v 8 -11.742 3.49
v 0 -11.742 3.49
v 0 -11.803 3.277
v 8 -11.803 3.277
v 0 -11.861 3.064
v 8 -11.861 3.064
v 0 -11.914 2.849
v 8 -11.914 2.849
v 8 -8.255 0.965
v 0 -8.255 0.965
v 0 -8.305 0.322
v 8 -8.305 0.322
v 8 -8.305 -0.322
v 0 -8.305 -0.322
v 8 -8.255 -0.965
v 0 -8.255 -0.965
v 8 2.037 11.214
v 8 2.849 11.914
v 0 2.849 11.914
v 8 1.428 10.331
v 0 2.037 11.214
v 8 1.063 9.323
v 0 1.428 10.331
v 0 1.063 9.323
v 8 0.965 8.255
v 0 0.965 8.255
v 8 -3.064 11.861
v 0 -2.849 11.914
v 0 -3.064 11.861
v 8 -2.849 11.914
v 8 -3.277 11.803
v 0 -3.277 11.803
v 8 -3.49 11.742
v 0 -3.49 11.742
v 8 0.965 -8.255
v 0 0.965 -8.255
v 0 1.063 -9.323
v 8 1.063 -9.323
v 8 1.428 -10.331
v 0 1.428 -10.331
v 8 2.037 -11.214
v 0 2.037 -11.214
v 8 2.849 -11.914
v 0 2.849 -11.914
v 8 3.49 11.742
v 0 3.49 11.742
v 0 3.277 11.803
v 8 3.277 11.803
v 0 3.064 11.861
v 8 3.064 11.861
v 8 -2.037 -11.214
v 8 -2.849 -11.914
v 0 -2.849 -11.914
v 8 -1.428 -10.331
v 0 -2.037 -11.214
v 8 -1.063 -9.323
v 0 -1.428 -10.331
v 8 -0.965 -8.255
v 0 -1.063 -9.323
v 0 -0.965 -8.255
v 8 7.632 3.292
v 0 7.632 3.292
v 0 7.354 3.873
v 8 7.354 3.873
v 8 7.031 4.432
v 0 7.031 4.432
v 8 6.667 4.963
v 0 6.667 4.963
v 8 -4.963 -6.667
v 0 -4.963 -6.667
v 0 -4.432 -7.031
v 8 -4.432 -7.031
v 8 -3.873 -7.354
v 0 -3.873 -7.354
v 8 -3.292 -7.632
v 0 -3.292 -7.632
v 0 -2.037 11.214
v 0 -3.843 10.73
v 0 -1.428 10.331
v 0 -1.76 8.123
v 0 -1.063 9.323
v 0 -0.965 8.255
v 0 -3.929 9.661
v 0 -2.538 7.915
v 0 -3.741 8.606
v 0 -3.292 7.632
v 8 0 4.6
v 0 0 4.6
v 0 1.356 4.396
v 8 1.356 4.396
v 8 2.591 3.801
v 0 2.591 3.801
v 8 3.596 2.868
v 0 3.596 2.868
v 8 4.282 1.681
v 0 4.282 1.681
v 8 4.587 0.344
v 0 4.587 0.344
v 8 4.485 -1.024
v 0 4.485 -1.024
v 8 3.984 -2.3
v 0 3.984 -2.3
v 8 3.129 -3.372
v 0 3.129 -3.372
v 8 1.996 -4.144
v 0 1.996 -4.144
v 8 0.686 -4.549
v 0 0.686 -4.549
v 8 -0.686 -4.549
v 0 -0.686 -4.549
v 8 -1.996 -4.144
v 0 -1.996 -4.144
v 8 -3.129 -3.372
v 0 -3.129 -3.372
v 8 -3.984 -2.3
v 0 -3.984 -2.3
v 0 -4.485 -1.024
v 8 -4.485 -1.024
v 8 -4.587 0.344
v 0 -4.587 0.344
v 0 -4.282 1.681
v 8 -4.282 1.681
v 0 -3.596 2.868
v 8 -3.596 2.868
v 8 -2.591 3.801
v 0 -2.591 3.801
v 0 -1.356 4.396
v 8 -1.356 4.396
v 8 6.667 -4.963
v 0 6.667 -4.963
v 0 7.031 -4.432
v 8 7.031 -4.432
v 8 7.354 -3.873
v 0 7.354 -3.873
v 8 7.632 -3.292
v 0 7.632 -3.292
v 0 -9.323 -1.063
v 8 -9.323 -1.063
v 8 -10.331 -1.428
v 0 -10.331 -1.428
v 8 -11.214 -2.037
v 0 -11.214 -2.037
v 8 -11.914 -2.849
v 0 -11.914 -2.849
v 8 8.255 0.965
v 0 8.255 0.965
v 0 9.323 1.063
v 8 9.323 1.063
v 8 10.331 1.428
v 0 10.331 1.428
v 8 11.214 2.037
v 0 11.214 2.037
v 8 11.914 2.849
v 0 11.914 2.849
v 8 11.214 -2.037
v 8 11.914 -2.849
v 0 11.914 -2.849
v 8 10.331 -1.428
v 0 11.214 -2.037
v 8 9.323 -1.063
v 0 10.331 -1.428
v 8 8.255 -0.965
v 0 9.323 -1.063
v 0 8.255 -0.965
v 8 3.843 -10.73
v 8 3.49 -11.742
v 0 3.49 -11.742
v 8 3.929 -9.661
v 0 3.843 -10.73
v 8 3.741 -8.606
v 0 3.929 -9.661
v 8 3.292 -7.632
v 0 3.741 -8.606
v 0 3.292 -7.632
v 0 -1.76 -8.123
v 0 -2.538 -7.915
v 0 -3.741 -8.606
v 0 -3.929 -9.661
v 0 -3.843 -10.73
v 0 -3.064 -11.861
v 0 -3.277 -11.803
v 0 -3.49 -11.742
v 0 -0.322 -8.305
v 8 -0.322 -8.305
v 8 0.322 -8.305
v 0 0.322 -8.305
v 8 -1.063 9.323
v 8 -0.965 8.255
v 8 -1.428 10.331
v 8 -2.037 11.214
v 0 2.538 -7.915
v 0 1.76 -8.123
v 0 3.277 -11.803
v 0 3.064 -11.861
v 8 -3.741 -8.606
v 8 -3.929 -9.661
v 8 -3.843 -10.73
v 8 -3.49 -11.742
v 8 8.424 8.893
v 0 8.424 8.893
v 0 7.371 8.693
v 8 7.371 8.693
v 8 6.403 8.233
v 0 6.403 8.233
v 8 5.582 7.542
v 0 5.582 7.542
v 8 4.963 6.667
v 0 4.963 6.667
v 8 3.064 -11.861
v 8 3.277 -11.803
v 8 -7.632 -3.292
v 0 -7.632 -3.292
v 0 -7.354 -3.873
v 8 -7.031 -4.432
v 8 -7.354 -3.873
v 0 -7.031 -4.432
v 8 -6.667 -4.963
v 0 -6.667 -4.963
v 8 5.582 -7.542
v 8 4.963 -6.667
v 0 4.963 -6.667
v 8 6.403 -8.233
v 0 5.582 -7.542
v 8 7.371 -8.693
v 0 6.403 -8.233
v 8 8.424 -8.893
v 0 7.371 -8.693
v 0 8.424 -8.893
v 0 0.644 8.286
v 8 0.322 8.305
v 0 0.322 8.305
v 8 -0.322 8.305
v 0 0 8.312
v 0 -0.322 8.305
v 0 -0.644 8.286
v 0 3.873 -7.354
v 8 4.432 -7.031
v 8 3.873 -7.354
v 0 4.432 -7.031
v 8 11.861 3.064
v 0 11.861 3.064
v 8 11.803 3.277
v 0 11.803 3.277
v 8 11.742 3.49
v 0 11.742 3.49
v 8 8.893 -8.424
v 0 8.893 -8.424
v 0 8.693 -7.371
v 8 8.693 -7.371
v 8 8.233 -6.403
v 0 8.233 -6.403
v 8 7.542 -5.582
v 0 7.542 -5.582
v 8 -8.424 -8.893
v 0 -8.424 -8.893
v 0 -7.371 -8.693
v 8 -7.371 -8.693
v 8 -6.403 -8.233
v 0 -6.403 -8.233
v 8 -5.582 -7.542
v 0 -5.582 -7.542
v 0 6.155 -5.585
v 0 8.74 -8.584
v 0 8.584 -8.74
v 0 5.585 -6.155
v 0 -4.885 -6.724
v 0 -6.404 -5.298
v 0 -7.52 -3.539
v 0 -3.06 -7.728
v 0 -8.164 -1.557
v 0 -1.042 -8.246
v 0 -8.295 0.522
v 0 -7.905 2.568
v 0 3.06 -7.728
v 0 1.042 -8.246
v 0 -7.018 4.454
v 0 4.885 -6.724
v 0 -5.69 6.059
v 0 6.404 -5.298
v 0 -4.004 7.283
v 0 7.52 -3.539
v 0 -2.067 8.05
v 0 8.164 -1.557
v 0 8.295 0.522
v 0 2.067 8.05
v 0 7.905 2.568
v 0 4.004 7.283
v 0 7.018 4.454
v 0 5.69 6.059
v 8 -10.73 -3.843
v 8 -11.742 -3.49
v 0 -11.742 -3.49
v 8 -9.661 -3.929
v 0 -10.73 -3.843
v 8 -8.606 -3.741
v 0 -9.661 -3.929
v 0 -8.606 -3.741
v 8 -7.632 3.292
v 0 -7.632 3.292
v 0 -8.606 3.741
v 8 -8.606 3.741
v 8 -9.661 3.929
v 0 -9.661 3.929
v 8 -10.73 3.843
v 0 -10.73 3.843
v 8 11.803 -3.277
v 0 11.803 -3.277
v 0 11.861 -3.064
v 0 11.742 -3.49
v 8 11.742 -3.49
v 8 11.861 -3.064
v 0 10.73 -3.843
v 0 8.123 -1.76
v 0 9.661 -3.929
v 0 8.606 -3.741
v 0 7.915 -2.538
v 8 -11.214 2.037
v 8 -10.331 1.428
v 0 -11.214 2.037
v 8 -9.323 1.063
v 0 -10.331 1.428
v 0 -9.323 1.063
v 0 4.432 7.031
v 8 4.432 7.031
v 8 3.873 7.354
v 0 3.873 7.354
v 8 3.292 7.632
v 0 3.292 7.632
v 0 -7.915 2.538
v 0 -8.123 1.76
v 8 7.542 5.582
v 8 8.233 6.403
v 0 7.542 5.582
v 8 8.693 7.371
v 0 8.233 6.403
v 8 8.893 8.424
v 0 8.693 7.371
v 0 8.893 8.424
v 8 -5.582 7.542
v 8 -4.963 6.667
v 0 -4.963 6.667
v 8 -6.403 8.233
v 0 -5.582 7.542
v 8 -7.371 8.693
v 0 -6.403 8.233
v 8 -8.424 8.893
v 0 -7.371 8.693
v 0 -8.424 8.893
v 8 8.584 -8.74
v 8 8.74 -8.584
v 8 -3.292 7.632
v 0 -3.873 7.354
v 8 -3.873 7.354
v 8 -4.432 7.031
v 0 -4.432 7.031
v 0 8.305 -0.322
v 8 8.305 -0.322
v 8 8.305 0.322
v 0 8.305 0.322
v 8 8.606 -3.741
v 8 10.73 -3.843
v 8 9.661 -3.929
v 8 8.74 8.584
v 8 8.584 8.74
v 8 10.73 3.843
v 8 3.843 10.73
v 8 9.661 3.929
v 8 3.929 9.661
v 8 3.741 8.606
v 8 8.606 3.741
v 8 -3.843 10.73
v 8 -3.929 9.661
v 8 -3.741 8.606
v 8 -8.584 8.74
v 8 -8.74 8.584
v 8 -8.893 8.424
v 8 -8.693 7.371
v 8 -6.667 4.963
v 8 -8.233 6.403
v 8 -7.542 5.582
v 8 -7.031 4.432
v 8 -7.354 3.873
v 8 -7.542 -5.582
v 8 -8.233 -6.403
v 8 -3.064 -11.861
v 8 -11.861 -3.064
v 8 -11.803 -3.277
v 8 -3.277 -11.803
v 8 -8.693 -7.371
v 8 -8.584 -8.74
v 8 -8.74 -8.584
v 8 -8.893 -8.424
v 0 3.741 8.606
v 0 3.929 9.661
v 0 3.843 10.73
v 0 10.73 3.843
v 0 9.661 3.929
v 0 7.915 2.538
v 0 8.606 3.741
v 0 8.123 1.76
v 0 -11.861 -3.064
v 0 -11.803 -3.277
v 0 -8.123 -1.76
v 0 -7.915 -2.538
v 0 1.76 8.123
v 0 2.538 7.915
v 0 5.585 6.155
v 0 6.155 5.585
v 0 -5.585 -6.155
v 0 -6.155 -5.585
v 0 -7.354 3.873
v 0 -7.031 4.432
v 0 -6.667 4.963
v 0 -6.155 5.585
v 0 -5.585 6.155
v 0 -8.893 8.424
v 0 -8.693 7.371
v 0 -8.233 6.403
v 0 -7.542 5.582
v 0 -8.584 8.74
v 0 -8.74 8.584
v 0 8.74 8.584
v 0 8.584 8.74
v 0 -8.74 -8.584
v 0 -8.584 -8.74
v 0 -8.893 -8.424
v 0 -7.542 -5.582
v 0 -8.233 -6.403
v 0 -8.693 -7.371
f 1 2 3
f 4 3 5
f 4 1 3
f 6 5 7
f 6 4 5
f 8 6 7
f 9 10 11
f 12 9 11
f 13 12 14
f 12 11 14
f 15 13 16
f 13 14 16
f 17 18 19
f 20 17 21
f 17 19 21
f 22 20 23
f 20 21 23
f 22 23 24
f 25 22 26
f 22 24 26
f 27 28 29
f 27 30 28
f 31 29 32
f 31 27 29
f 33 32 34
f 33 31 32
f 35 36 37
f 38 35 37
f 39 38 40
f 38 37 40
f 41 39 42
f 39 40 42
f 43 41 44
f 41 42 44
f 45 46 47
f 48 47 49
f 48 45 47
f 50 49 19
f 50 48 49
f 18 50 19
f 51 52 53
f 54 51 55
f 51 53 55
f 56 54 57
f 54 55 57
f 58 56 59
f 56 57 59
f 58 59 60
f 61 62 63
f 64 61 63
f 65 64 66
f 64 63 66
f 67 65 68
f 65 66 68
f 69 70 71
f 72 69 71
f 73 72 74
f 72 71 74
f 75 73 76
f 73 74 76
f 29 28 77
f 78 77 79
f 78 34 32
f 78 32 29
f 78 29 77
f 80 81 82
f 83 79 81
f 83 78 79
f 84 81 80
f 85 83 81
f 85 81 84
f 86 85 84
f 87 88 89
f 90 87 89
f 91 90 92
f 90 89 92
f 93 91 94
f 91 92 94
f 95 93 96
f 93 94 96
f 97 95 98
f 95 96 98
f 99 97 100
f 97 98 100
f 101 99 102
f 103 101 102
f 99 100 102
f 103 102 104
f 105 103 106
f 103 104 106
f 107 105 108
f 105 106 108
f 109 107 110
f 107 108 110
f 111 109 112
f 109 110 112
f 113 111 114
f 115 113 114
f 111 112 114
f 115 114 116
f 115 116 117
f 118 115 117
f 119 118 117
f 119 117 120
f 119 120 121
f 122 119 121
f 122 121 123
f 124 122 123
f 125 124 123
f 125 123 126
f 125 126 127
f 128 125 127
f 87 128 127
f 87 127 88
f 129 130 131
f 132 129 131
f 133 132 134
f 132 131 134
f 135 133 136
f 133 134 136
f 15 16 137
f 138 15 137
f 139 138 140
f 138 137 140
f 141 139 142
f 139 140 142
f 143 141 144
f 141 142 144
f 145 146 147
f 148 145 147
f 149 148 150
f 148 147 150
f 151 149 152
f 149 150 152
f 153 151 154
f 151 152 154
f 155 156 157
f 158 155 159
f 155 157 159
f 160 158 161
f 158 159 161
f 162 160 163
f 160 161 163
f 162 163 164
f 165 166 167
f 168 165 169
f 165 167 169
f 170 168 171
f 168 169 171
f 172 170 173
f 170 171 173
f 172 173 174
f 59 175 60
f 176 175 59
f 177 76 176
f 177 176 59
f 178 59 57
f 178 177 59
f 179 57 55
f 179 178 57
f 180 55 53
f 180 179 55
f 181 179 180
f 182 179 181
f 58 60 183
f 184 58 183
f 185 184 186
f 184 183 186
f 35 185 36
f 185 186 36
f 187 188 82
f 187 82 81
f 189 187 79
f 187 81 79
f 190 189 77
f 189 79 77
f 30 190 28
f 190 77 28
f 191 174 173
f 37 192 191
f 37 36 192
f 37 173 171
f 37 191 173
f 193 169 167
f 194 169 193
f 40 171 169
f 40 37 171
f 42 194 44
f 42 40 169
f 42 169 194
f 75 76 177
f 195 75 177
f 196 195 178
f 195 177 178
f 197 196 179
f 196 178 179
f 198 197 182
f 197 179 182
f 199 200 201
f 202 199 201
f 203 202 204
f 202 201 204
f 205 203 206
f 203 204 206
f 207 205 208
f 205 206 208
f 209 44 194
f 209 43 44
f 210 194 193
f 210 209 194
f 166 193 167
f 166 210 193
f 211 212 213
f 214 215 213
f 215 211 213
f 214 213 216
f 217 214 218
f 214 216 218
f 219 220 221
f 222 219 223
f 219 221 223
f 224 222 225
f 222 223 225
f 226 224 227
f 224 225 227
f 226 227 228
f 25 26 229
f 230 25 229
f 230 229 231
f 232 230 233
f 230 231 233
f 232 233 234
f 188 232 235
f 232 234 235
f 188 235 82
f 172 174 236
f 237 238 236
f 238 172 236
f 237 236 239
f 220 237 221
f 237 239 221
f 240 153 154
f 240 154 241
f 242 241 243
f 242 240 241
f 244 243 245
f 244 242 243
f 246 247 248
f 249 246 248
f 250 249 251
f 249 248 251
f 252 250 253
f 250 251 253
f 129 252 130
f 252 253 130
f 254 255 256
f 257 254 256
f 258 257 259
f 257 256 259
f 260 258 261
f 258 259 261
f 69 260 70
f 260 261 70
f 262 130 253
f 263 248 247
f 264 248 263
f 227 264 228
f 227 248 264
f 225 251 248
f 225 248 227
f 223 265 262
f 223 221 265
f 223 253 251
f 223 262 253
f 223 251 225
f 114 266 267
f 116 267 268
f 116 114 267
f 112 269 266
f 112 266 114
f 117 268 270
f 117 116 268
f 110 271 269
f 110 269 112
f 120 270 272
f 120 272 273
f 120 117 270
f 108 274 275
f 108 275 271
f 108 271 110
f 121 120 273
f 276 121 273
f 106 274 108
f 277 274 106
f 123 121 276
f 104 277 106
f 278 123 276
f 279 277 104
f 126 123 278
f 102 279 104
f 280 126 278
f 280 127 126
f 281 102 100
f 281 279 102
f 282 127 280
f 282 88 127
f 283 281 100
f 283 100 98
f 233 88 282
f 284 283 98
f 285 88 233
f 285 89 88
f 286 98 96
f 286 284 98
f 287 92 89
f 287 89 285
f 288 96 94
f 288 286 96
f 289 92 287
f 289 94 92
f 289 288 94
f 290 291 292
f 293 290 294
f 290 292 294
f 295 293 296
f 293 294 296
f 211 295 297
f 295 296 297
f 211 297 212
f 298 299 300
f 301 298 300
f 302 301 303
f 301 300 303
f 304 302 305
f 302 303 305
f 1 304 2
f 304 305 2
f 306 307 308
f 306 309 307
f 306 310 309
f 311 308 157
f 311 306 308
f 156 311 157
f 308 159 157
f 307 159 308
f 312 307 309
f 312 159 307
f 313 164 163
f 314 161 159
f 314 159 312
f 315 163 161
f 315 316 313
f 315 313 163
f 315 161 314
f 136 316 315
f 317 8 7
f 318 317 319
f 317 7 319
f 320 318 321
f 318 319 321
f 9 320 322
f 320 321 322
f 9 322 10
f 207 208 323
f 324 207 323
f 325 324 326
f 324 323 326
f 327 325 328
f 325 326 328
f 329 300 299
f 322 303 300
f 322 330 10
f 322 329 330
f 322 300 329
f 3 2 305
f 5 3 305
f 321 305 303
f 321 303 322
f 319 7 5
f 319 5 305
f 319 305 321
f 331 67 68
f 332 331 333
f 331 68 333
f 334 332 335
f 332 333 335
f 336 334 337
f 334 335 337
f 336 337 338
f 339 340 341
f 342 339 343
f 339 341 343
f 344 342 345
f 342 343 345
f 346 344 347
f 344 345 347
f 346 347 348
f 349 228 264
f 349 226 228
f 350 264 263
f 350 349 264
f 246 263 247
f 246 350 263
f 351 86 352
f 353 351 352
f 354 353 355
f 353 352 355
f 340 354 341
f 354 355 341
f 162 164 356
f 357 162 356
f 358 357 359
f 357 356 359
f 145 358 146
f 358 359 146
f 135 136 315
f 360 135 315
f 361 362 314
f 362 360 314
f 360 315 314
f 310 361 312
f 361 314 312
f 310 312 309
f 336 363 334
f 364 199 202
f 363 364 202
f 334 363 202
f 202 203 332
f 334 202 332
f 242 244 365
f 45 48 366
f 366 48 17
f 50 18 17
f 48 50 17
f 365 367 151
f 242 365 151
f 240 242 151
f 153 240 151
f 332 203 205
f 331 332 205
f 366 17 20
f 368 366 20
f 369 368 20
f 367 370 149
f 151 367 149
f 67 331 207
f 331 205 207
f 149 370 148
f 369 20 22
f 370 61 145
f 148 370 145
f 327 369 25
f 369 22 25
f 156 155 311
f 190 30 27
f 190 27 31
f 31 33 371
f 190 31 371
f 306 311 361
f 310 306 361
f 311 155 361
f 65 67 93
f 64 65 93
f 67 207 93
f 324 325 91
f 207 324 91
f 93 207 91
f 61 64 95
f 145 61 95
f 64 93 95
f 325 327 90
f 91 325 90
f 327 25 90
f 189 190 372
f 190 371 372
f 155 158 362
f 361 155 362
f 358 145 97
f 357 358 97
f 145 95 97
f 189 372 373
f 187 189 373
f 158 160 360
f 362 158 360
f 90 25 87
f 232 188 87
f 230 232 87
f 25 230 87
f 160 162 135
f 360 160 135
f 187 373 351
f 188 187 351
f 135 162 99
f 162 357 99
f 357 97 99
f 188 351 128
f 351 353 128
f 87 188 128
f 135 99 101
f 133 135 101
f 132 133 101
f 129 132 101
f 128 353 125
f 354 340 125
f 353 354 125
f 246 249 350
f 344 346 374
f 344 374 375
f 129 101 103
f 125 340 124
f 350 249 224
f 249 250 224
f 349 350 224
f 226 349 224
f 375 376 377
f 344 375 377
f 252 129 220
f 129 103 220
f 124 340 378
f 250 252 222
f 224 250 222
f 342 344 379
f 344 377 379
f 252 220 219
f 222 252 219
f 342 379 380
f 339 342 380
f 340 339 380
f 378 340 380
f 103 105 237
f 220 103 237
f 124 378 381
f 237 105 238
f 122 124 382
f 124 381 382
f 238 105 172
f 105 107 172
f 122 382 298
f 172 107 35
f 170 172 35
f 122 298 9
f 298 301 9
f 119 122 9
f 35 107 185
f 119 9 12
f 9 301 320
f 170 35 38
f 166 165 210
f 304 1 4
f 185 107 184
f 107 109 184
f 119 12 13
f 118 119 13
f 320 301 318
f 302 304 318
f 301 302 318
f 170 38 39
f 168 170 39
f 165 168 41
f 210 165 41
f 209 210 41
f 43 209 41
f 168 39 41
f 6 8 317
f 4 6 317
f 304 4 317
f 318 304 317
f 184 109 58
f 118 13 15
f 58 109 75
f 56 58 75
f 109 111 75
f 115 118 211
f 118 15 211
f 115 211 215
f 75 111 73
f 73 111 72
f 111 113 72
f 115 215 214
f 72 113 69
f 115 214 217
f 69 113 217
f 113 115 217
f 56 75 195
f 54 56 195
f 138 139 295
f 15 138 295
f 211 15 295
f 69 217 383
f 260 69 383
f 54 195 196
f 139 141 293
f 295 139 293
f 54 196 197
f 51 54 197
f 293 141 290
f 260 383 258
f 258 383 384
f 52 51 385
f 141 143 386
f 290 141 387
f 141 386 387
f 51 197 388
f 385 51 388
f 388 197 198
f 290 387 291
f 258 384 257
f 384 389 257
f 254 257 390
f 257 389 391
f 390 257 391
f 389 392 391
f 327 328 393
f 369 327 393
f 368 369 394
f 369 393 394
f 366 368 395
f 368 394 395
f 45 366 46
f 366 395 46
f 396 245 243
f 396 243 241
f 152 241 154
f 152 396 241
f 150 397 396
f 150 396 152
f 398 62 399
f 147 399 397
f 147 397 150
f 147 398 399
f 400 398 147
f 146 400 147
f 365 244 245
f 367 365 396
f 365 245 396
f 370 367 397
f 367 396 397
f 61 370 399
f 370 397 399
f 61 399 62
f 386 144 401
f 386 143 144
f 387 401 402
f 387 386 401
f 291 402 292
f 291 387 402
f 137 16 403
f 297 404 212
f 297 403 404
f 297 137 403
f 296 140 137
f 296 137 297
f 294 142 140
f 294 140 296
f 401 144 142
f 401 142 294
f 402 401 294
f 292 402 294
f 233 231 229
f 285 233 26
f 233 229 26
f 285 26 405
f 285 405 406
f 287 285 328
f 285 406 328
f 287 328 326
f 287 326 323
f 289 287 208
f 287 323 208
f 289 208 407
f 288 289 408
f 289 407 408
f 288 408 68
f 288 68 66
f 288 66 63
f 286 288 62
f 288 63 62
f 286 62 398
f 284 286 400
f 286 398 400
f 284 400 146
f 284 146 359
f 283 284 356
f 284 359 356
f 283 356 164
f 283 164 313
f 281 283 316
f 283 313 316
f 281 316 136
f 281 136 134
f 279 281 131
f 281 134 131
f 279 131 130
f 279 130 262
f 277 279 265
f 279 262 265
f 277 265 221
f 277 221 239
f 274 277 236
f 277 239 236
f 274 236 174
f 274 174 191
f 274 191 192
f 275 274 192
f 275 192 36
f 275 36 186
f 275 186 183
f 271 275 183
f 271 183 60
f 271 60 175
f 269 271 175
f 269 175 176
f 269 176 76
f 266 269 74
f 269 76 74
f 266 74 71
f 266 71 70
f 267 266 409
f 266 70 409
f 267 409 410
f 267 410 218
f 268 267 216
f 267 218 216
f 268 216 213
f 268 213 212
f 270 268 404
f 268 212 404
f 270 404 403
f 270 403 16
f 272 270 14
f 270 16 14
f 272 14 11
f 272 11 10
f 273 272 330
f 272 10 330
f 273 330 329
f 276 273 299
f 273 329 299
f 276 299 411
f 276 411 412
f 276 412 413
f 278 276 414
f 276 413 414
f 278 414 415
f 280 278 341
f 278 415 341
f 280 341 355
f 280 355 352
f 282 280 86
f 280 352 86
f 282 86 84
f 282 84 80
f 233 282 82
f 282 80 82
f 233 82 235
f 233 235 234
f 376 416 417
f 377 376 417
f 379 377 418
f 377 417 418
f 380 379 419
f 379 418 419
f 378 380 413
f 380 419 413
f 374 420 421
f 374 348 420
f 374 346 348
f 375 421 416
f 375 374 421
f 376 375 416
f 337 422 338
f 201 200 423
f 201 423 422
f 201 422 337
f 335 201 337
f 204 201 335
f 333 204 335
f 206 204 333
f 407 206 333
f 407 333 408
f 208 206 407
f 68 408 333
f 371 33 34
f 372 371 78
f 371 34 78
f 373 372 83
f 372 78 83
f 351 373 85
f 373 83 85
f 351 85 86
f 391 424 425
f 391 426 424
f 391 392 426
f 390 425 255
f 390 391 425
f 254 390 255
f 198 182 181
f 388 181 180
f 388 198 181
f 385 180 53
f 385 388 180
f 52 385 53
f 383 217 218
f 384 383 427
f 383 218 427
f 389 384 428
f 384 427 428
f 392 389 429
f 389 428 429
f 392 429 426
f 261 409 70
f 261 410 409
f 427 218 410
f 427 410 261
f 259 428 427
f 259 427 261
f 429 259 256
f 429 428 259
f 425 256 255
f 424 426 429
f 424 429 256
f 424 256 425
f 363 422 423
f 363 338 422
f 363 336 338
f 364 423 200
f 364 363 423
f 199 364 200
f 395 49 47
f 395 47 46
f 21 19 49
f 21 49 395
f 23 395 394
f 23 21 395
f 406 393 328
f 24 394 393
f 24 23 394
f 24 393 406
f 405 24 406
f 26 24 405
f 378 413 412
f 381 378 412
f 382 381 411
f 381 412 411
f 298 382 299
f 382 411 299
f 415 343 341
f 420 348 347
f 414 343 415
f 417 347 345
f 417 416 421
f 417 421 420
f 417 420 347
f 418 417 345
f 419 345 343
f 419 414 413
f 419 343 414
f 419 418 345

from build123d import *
from build123d.topology import SkipClean

# Parameters (mm, degrees)
BASPROSKE_W             = 8
BASPROSKE_H             = 12.25
TOOTHCUT_DEPTH          = 20.082059637
TEETHCUTS_COUNT         = 12
TEETHCUTS_ANGLE         = 330
HUBNEAONESKE_R          = 8.3115
HUBNEARONE_DEPTH        = 8.0000508
BORSKE_R                = 4.5
BORE_DEPTH              = 16.0000508
ESQUISSE1_R             = 8.3115
ENL_V_MAT_EXTRU_1_DEPTH = 8
ESQUISSE2_R             = 4.5
ESQUISSE2_R_2           = 4.275
BOSS_EXTRU_1_DEPTH      = 8
ESQUISSE3_R             = 4.6
ENL_V_MAT_EXTRU_2_DEPTH = 10


with BuildPart() as part:
    # BasProSke → Base-Revolve (revolve)
    with BuildSketch(Plane(origin=(0, 0, 0), x_dir=(1, 0, 0), z_dir=(0, 1, 0)), mode=Mode.PRIVATE) as base_revolve_sk:
        with Locations((4, 6.125)):
            Rectangle(BASPROSKE_W, BASPROSKE_H)
    revolve(base_revolve_sk.sketch.rotate(Axis((-10, 0, 0), (1, 0, 0)), 180), axis=Axis((-10, 0, 0), (1, 0, 0)))

    # TooCutSke → ToothCut (cut, through all)
    with BuildSketch(Plane(origin=(0, 0, 0), x_dir=(0, 0, -1), z_dir=(1, 0, 0))):
        with BuildLine():
            ThreePointArc((0.965128363, 8.255274647), (0, 8.3115), (-0.965128363, 8.255274647))
            ThreePointArc((-0.965128363, 8.255274647), (-1.43628674, 10.346733197), (-2.878284339, 11.933185846))
            ThreePointArc((-2.878284339, 11.933185846), (0, 12.2754), (2.878284339, 11.933185846))
            ThreePointArc((2.878284339, 11.933185846), (1.43628674, 10.346733197), (0.965128363, 8.255274647))
        make_face()
    toothcut = extrude(amount=TOOTHCUT_DEPTH, mode=Mode.SUBTRACT)

    # TeethCuts: ToothCut ×12 about axis
    teethcuts_axis = Axis((-10, 0, 0), (1, 0, 0))
    for i in range(1, TEETHCUTS_COUNT):
        add(toothcut.rotate(teethcuts_axis, i * TEETHCUTS_ANGLE / (TEETHCUTS_COUNT - 1)), mode=Mode.SUBTRACT)

    # HubNeaOneSke → HubNearOne (add)
    with SkipClean():  # the faces are left unmerged after this step: merging them gives an invalid solid
        with BuildSketch(Plane.ZY):
            Circle(HUBNEAONESKE_R)
        extrude(amount=HUBNEARONE_DEPTH)

    # BorSke → Bore (cut, symmetric)
    with SkipClean():  # the faces are left unmerged after this step: merging them gives an invalid solid
        with BuildSketch(Plane(origin=(0, 0, 0), x_dir=(0, 0, -1), z_dir=(1, 0, 0))):
            with Locations(Location((0, 0, 0), (0, 0, 180))):
                Circle(BORSKE_R)
        extrude(amount=BORE_DEPTH, both=True, mode=Mode.SUBTRACT)

    # Esquisse1 → Enlèv. mat.-Extru.1 (cut)
    with SkipClean():  # the faces are left unmerged after this step: merging them gives an invalid solid
        with BuildSketch(Plane.ZY.offset(8.0000508)):
            Circle(ESQUISSE1_R)
        extrude(amount=-ENL_V_MAT_EXTRU_1_DEPTH, mode=Mode.SUBTRACT)

    # Esquisse2 → Boss.-Extru.1 (add)
    with SkipClean():  # the faces are left unmerged after this step: merging them gives an invalid solid
        with BuildSketch(Plane(origin=(8, 0, 0), x_dir=(0, 0, -1), z_dir=(1, 0, 0))):
            with Locations(Location((0, 0, 0), (0, 0, 180))):
                Circle(ESQUISSE2_R)
            Circle(ESQUISSE2_R_2, mode=Mode.SUBTRACT)
        extrude(amount=-BOSS_EXTRU_1_DEPTH)

    # Esquisse3 → Enlèv. mat.-Extru.2 (cut)
    with SkipClean():  # the faces are left unmerged after this step: merging them gives an invalid solid
        with BuildSketch(Plane.ZY.offset(5.08e-05)):
            Circle(ESQUISSE3_R)
        extrude(amount=-ENL_V_MAT_EXTRU_2_DEPTH, mode=Mode.SUBTRACT)


solid = part.part
